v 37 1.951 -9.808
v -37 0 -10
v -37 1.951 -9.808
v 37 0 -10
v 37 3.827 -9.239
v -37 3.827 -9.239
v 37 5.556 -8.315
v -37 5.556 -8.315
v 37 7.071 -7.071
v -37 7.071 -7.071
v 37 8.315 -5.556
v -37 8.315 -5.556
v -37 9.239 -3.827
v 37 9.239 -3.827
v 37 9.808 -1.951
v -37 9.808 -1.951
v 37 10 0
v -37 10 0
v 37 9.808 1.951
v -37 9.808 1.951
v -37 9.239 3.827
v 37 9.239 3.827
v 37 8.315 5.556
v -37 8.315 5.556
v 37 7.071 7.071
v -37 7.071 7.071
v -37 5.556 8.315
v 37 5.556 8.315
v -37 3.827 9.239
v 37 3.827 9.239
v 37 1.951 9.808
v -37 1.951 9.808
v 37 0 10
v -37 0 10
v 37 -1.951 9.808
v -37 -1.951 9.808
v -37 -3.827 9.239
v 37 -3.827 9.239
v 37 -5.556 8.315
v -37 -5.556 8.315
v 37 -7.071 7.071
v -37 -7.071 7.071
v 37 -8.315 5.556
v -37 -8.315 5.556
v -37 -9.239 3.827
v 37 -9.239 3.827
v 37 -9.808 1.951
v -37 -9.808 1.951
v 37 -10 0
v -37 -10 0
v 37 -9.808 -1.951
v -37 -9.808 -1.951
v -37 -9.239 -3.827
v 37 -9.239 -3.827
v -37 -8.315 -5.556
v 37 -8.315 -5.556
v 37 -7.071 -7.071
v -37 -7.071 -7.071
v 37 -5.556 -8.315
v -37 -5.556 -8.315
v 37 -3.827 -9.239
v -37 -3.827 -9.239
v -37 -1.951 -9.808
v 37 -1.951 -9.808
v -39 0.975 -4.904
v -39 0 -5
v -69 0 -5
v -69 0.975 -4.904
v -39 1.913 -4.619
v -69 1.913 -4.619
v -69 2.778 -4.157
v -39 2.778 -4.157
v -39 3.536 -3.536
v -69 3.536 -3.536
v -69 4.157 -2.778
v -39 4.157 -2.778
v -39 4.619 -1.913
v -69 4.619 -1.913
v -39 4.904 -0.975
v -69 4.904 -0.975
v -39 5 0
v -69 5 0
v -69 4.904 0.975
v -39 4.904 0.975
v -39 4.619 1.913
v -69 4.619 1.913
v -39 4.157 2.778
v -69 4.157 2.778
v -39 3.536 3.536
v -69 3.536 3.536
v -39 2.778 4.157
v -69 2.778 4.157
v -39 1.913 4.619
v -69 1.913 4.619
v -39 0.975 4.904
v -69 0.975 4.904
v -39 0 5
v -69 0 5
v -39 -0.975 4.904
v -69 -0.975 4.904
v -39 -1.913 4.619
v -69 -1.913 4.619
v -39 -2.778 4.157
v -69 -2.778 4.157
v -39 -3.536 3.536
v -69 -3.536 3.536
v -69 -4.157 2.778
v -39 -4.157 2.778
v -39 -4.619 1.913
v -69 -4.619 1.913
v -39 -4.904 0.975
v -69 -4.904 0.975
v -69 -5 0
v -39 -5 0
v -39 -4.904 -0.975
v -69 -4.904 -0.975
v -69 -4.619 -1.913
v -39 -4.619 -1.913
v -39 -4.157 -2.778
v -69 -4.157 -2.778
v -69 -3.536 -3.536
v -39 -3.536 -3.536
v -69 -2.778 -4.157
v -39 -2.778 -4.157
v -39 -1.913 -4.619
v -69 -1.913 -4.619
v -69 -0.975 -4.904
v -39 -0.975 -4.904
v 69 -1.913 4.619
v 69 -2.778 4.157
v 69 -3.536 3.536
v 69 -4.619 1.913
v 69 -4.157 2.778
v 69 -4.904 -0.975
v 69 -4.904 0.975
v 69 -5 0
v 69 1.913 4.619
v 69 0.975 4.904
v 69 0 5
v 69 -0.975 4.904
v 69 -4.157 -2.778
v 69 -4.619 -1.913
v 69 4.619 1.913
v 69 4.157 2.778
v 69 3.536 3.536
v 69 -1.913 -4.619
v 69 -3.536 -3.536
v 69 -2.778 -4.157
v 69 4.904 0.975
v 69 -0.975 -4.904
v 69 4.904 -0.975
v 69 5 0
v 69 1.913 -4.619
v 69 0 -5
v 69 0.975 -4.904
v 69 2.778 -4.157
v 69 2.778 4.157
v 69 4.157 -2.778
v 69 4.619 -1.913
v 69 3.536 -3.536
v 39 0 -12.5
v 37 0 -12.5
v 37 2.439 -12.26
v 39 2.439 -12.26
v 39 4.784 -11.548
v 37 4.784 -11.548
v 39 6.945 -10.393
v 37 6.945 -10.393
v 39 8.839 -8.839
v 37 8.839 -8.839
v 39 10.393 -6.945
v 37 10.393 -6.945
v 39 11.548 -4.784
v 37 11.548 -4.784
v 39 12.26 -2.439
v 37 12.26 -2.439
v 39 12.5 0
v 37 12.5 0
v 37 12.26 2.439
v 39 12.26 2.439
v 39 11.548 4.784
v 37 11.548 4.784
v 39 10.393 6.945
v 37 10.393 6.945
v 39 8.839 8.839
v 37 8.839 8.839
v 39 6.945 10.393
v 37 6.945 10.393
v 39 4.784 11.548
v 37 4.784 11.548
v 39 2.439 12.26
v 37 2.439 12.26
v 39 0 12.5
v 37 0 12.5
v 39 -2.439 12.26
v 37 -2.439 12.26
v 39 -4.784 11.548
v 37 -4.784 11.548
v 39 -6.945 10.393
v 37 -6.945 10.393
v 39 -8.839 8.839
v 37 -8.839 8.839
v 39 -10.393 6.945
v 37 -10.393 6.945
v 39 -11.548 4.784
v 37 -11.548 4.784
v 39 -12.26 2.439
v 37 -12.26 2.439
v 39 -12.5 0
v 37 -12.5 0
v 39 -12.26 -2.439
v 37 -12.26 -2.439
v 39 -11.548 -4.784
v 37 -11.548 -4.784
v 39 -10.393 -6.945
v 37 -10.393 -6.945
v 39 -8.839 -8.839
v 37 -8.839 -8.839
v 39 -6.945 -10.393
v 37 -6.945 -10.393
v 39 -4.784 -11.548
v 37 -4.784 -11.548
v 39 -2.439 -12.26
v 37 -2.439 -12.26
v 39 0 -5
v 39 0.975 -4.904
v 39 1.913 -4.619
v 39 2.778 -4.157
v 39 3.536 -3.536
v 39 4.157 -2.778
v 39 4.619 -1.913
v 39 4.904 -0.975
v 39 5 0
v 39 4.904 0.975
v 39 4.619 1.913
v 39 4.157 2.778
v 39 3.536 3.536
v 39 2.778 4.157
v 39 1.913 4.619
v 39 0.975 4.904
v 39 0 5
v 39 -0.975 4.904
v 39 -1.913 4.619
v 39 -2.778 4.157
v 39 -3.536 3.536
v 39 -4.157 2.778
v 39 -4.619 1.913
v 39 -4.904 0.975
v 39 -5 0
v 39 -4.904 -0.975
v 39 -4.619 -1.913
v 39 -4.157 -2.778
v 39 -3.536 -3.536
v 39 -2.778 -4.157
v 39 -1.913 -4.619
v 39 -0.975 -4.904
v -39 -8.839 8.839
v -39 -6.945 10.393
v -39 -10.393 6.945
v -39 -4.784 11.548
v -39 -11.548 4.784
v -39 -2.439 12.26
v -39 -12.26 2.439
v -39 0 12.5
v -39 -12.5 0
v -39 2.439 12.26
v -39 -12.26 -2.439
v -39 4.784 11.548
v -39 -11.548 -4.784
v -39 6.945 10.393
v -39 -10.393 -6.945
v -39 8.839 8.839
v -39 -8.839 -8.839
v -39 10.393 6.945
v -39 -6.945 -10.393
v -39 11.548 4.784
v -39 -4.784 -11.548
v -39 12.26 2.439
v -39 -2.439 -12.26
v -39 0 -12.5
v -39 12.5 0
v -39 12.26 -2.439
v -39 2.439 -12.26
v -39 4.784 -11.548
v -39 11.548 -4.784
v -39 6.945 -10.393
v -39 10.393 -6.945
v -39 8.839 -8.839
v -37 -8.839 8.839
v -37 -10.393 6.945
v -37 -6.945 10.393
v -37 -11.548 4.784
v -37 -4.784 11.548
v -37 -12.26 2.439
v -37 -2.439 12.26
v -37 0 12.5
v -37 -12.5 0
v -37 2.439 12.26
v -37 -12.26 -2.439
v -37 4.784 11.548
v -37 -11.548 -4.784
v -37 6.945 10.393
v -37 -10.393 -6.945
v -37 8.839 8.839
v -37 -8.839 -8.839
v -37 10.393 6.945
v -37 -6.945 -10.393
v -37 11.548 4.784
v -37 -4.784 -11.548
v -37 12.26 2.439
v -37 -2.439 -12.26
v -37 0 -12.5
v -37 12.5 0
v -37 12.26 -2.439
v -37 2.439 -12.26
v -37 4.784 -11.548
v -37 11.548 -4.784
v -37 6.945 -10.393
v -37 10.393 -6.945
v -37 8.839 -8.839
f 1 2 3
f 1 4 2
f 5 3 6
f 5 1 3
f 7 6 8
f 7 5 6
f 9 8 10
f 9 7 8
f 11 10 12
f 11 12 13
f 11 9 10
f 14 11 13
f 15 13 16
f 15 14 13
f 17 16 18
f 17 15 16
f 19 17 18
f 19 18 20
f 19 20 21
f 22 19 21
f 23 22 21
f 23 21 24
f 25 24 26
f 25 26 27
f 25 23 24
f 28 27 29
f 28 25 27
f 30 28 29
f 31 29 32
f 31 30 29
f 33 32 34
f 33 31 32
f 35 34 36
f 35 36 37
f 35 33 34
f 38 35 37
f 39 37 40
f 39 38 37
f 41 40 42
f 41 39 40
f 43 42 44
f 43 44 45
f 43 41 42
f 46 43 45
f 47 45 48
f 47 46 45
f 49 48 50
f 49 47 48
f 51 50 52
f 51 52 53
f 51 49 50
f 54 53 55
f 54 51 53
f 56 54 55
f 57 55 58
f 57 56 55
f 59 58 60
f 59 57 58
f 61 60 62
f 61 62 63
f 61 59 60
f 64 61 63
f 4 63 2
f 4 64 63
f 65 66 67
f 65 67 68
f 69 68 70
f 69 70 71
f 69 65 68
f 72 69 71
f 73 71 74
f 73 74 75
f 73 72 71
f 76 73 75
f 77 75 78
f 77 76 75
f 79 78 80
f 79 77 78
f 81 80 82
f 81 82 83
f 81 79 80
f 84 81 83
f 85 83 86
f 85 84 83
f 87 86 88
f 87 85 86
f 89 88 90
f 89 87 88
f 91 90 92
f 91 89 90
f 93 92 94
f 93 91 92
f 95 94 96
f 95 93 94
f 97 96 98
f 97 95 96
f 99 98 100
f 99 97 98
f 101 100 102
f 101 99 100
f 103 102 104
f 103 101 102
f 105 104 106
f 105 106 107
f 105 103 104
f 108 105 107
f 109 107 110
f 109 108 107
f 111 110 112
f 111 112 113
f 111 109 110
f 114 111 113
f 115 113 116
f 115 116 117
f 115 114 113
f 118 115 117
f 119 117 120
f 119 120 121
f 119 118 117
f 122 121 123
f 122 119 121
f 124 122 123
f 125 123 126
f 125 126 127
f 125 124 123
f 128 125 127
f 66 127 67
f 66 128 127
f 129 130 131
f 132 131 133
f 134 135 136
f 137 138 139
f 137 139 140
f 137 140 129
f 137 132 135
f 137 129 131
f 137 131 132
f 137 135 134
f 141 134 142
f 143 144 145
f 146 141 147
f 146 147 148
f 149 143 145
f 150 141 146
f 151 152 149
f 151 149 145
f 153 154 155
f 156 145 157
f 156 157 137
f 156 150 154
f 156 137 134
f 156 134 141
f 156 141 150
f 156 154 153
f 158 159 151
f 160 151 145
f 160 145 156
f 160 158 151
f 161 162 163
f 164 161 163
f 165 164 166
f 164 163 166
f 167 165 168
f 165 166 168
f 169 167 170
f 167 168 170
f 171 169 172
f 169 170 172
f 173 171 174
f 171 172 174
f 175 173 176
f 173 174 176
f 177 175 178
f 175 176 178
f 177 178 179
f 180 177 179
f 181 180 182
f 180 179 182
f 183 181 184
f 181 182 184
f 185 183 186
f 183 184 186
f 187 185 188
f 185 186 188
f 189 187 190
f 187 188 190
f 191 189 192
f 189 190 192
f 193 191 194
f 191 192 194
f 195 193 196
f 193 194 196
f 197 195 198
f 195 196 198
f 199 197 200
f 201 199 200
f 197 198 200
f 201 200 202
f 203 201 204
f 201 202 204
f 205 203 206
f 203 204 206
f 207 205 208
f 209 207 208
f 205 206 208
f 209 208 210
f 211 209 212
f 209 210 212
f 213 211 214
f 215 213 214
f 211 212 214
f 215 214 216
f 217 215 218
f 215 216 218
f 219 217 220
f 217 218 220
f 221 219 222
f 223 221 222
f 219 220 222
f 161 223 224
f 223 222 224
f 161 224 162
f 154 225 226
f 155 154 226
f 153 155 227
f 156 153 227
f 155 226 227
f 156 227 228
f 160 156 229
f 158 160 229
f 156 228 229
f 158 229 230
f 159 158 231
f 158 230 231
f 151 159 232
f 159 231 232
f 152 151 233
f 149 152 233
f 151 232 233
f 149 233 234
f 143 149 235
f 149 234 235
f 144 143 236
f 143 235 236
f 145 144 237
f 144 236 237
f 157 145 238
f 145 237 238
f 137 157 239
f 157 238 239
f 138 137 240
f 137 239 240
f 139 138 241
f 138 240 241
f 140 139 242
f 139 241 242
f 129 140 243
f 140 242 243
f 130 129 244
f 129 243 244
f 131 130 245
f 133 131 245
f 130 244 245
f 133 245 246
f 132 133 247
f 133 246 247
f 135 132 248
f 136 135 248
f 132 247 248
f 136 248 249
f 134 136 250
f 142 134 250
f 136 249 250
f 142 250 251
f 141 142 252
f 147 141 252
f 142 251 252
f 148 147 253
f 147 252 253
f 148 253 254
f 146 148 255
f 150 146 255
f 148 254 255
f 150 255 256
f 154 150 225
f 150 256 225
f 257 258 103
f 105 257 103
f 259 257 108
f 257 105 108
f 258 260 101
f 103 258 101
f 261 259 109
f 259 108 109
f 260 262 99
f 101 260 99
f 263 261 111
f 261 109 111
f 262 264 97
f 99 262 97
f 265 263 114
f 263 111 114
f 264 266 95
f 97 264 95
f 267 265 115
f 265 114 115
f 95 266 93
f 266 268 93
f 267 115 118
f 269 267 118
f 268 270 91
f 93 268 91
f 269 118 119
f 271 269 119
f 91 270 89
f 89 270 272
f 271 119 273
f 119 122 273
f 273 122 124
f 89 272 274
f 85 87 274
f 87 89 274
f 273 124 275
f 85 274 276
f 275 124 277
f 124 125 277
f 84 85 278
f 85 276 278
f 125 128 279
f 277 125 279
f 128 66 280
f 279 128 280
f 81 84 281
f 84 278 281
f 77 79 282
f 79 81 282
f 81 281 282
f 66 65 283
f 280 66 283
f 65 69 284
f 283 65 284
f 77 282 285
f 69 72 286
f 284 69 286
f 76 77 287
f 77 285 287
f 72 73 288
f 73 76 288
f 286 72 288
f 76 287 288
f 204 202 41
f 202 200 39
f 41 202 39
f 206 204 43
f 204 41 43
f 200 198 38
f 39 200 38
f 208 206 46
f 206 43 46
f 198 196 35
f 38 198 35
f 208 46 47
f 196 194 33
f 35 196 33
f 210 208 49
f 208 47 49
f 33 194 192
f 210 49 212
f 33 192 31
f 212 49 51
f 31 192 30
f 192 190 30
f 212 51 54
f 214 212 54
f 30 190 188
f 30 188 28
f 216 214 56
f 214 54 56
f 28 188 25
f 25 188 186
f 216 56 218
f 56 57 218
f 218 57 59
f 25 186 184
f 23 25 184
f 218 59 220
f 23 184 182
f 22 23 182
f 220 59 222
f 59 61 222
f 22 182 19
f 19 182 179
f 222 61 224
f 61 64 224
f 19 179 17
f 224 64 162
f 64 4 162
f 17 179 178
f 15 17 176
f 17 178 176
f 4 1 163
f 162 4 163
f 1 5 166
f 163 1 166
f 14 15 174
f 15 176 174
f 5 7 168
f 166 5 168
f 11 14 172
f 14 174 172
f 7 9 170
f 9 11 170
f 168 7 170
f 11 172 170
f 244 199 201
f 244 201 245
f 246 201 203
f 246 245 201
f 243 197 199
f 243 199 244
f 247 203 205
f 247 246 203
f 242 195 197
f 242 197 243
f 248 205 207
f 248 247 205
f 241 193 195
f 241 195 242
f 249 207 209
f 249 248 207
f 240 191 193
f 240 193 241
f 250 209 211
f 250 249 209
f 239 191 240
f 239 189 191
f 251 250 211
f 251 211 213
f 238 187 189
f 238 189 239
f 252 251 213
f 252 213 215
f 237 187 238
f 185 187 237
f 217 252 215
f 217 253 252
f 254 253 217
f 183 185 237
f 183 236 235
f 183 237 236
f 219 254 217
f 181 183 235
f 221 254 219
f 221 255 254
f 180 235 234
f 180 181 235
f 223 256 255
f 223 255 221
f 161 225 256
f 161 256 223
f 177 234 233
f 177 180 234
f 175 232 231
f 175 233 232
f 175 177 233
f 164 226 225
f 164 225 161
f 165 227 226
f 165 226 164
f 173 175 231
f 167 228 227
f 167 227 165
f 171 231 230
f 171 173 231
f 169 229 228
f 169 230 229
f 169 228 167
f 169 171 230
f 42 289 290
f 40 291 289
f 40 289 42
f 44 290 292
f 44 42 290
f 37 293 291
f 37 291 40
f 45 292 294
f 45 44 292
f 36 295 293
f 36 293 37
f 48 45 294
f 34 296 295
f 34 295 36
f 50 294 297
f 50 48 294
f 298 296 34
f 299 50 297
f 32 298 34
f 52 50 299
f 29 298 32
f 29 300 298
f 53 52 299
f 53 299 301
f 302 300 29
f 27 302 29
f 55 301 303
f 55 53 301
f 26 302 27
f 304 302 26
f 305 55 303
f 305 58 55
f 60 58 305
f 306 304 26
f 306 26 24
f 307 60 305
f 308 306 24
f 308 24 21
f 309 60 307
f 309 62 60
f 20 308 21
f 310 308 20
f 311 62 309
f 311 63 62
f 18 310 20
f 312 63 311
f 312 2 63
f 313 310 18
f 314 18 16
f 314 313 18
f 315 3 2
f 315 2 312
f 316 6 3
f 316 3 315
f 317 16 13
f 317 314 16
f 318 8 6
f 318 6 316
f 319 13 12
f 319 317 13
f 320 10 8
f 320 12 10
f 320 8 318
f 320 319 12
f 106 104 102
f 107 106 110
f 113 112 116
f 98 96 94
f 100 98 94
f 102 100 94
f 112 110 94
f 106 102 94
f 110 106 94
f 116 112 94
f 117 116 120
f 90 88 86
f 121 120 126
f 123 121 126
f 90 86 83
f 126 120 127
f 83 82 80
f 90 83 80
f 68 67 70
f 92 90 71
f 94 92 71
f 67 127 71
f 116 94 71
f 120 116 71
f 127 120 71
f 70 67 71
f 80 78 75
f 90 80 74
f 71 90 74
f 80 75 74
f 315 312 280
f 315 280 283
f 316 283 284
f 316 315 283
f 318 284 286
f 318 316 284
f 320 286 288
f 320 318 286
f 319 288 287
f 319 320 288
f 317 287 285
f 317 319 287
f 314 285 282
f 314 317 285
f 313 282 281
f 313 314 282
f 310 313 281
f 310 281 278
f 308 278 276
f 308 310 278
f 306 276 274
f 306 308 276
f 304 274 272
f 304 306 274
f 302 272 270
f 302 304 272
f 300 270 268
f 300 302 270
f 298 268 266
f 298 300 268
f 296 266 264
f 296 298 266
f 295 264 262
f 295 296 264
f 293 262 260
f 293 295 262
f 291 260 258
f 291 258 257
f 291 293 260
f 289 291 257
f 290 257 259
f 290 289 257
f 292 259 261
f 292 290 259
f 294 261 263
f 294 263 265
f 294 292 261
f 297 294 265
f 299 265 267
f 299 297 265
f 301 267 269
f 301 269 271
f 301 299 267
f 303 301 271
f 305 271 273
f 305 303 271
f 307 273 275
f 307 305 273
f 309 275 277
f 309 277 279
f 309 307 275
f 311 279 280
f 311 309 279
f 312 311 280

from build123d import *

# Parameters (mm, degrees)
SKETCH1_R           = 10
BOSS_EXTRUDE1_DEPTH = 37
SKETCH2_R           = 12.5
BOSS_EXTRUDE2_DEPTH = 2
SKETCH3_R           = 5
BOSS_EXTRUDE3_DEPTH = 30


with BuildPart() as part:
    # Sketch1 → Boss-Extrude1 (new body)
    with BuildSketch(Plane(origin=(0, 0, 0), x_dir=(0, 0, -1), z_dir=(1, 0, 0))):
        Circle(SKETCH1_R)
    boss_extrude1 = extrude(amount=BOSS_EXTRUDE1_DEPTH)

    # Sketch2 → Boss-Extrude2 (add)
    with BuildSketch(Plane(origin=(37, 0, 0), x_dir=(0, 0, -1), z_dir=(1, 0, 0))):
        Circle(SKETCH2_R)
    boss_extrude2 = extrude(amount=BOSS_EXTRUDE2_DEPTH)

    # Sketch3 → Boss-Extrude3 (add)
    with BuildSketch(Plane(origin=(39, 0, 0), x_dir=(0, 0, -1), z_dir=(1, 0, 0))):
        Circle(SKETCH3_R)
    boss_extrude3 = extrude(amount=BOSS_EXTRUDE3_DEPTH)

    # Mirror2: Boss-Extrude1, Boss-Extrude2, Boss-Extrude3 across plane
    add(boss_extrude1.mirror(Plane(origin=(0, 0, 0), x_dir=(0, 0, 1), z_dir=(1, 0, 0))))
    add(boss_extrude2.mirror(Plane(origin=(0, 0, 0), x_dir=(0, 0, 1), z_dir=(1, 0, 0))))
    add(boss_extrude3.mirror(Plane(origin=(0, 0, 0), x_dir=(0, 0, 1), z_dir=(1, 0, 0))))


solid = part.part
